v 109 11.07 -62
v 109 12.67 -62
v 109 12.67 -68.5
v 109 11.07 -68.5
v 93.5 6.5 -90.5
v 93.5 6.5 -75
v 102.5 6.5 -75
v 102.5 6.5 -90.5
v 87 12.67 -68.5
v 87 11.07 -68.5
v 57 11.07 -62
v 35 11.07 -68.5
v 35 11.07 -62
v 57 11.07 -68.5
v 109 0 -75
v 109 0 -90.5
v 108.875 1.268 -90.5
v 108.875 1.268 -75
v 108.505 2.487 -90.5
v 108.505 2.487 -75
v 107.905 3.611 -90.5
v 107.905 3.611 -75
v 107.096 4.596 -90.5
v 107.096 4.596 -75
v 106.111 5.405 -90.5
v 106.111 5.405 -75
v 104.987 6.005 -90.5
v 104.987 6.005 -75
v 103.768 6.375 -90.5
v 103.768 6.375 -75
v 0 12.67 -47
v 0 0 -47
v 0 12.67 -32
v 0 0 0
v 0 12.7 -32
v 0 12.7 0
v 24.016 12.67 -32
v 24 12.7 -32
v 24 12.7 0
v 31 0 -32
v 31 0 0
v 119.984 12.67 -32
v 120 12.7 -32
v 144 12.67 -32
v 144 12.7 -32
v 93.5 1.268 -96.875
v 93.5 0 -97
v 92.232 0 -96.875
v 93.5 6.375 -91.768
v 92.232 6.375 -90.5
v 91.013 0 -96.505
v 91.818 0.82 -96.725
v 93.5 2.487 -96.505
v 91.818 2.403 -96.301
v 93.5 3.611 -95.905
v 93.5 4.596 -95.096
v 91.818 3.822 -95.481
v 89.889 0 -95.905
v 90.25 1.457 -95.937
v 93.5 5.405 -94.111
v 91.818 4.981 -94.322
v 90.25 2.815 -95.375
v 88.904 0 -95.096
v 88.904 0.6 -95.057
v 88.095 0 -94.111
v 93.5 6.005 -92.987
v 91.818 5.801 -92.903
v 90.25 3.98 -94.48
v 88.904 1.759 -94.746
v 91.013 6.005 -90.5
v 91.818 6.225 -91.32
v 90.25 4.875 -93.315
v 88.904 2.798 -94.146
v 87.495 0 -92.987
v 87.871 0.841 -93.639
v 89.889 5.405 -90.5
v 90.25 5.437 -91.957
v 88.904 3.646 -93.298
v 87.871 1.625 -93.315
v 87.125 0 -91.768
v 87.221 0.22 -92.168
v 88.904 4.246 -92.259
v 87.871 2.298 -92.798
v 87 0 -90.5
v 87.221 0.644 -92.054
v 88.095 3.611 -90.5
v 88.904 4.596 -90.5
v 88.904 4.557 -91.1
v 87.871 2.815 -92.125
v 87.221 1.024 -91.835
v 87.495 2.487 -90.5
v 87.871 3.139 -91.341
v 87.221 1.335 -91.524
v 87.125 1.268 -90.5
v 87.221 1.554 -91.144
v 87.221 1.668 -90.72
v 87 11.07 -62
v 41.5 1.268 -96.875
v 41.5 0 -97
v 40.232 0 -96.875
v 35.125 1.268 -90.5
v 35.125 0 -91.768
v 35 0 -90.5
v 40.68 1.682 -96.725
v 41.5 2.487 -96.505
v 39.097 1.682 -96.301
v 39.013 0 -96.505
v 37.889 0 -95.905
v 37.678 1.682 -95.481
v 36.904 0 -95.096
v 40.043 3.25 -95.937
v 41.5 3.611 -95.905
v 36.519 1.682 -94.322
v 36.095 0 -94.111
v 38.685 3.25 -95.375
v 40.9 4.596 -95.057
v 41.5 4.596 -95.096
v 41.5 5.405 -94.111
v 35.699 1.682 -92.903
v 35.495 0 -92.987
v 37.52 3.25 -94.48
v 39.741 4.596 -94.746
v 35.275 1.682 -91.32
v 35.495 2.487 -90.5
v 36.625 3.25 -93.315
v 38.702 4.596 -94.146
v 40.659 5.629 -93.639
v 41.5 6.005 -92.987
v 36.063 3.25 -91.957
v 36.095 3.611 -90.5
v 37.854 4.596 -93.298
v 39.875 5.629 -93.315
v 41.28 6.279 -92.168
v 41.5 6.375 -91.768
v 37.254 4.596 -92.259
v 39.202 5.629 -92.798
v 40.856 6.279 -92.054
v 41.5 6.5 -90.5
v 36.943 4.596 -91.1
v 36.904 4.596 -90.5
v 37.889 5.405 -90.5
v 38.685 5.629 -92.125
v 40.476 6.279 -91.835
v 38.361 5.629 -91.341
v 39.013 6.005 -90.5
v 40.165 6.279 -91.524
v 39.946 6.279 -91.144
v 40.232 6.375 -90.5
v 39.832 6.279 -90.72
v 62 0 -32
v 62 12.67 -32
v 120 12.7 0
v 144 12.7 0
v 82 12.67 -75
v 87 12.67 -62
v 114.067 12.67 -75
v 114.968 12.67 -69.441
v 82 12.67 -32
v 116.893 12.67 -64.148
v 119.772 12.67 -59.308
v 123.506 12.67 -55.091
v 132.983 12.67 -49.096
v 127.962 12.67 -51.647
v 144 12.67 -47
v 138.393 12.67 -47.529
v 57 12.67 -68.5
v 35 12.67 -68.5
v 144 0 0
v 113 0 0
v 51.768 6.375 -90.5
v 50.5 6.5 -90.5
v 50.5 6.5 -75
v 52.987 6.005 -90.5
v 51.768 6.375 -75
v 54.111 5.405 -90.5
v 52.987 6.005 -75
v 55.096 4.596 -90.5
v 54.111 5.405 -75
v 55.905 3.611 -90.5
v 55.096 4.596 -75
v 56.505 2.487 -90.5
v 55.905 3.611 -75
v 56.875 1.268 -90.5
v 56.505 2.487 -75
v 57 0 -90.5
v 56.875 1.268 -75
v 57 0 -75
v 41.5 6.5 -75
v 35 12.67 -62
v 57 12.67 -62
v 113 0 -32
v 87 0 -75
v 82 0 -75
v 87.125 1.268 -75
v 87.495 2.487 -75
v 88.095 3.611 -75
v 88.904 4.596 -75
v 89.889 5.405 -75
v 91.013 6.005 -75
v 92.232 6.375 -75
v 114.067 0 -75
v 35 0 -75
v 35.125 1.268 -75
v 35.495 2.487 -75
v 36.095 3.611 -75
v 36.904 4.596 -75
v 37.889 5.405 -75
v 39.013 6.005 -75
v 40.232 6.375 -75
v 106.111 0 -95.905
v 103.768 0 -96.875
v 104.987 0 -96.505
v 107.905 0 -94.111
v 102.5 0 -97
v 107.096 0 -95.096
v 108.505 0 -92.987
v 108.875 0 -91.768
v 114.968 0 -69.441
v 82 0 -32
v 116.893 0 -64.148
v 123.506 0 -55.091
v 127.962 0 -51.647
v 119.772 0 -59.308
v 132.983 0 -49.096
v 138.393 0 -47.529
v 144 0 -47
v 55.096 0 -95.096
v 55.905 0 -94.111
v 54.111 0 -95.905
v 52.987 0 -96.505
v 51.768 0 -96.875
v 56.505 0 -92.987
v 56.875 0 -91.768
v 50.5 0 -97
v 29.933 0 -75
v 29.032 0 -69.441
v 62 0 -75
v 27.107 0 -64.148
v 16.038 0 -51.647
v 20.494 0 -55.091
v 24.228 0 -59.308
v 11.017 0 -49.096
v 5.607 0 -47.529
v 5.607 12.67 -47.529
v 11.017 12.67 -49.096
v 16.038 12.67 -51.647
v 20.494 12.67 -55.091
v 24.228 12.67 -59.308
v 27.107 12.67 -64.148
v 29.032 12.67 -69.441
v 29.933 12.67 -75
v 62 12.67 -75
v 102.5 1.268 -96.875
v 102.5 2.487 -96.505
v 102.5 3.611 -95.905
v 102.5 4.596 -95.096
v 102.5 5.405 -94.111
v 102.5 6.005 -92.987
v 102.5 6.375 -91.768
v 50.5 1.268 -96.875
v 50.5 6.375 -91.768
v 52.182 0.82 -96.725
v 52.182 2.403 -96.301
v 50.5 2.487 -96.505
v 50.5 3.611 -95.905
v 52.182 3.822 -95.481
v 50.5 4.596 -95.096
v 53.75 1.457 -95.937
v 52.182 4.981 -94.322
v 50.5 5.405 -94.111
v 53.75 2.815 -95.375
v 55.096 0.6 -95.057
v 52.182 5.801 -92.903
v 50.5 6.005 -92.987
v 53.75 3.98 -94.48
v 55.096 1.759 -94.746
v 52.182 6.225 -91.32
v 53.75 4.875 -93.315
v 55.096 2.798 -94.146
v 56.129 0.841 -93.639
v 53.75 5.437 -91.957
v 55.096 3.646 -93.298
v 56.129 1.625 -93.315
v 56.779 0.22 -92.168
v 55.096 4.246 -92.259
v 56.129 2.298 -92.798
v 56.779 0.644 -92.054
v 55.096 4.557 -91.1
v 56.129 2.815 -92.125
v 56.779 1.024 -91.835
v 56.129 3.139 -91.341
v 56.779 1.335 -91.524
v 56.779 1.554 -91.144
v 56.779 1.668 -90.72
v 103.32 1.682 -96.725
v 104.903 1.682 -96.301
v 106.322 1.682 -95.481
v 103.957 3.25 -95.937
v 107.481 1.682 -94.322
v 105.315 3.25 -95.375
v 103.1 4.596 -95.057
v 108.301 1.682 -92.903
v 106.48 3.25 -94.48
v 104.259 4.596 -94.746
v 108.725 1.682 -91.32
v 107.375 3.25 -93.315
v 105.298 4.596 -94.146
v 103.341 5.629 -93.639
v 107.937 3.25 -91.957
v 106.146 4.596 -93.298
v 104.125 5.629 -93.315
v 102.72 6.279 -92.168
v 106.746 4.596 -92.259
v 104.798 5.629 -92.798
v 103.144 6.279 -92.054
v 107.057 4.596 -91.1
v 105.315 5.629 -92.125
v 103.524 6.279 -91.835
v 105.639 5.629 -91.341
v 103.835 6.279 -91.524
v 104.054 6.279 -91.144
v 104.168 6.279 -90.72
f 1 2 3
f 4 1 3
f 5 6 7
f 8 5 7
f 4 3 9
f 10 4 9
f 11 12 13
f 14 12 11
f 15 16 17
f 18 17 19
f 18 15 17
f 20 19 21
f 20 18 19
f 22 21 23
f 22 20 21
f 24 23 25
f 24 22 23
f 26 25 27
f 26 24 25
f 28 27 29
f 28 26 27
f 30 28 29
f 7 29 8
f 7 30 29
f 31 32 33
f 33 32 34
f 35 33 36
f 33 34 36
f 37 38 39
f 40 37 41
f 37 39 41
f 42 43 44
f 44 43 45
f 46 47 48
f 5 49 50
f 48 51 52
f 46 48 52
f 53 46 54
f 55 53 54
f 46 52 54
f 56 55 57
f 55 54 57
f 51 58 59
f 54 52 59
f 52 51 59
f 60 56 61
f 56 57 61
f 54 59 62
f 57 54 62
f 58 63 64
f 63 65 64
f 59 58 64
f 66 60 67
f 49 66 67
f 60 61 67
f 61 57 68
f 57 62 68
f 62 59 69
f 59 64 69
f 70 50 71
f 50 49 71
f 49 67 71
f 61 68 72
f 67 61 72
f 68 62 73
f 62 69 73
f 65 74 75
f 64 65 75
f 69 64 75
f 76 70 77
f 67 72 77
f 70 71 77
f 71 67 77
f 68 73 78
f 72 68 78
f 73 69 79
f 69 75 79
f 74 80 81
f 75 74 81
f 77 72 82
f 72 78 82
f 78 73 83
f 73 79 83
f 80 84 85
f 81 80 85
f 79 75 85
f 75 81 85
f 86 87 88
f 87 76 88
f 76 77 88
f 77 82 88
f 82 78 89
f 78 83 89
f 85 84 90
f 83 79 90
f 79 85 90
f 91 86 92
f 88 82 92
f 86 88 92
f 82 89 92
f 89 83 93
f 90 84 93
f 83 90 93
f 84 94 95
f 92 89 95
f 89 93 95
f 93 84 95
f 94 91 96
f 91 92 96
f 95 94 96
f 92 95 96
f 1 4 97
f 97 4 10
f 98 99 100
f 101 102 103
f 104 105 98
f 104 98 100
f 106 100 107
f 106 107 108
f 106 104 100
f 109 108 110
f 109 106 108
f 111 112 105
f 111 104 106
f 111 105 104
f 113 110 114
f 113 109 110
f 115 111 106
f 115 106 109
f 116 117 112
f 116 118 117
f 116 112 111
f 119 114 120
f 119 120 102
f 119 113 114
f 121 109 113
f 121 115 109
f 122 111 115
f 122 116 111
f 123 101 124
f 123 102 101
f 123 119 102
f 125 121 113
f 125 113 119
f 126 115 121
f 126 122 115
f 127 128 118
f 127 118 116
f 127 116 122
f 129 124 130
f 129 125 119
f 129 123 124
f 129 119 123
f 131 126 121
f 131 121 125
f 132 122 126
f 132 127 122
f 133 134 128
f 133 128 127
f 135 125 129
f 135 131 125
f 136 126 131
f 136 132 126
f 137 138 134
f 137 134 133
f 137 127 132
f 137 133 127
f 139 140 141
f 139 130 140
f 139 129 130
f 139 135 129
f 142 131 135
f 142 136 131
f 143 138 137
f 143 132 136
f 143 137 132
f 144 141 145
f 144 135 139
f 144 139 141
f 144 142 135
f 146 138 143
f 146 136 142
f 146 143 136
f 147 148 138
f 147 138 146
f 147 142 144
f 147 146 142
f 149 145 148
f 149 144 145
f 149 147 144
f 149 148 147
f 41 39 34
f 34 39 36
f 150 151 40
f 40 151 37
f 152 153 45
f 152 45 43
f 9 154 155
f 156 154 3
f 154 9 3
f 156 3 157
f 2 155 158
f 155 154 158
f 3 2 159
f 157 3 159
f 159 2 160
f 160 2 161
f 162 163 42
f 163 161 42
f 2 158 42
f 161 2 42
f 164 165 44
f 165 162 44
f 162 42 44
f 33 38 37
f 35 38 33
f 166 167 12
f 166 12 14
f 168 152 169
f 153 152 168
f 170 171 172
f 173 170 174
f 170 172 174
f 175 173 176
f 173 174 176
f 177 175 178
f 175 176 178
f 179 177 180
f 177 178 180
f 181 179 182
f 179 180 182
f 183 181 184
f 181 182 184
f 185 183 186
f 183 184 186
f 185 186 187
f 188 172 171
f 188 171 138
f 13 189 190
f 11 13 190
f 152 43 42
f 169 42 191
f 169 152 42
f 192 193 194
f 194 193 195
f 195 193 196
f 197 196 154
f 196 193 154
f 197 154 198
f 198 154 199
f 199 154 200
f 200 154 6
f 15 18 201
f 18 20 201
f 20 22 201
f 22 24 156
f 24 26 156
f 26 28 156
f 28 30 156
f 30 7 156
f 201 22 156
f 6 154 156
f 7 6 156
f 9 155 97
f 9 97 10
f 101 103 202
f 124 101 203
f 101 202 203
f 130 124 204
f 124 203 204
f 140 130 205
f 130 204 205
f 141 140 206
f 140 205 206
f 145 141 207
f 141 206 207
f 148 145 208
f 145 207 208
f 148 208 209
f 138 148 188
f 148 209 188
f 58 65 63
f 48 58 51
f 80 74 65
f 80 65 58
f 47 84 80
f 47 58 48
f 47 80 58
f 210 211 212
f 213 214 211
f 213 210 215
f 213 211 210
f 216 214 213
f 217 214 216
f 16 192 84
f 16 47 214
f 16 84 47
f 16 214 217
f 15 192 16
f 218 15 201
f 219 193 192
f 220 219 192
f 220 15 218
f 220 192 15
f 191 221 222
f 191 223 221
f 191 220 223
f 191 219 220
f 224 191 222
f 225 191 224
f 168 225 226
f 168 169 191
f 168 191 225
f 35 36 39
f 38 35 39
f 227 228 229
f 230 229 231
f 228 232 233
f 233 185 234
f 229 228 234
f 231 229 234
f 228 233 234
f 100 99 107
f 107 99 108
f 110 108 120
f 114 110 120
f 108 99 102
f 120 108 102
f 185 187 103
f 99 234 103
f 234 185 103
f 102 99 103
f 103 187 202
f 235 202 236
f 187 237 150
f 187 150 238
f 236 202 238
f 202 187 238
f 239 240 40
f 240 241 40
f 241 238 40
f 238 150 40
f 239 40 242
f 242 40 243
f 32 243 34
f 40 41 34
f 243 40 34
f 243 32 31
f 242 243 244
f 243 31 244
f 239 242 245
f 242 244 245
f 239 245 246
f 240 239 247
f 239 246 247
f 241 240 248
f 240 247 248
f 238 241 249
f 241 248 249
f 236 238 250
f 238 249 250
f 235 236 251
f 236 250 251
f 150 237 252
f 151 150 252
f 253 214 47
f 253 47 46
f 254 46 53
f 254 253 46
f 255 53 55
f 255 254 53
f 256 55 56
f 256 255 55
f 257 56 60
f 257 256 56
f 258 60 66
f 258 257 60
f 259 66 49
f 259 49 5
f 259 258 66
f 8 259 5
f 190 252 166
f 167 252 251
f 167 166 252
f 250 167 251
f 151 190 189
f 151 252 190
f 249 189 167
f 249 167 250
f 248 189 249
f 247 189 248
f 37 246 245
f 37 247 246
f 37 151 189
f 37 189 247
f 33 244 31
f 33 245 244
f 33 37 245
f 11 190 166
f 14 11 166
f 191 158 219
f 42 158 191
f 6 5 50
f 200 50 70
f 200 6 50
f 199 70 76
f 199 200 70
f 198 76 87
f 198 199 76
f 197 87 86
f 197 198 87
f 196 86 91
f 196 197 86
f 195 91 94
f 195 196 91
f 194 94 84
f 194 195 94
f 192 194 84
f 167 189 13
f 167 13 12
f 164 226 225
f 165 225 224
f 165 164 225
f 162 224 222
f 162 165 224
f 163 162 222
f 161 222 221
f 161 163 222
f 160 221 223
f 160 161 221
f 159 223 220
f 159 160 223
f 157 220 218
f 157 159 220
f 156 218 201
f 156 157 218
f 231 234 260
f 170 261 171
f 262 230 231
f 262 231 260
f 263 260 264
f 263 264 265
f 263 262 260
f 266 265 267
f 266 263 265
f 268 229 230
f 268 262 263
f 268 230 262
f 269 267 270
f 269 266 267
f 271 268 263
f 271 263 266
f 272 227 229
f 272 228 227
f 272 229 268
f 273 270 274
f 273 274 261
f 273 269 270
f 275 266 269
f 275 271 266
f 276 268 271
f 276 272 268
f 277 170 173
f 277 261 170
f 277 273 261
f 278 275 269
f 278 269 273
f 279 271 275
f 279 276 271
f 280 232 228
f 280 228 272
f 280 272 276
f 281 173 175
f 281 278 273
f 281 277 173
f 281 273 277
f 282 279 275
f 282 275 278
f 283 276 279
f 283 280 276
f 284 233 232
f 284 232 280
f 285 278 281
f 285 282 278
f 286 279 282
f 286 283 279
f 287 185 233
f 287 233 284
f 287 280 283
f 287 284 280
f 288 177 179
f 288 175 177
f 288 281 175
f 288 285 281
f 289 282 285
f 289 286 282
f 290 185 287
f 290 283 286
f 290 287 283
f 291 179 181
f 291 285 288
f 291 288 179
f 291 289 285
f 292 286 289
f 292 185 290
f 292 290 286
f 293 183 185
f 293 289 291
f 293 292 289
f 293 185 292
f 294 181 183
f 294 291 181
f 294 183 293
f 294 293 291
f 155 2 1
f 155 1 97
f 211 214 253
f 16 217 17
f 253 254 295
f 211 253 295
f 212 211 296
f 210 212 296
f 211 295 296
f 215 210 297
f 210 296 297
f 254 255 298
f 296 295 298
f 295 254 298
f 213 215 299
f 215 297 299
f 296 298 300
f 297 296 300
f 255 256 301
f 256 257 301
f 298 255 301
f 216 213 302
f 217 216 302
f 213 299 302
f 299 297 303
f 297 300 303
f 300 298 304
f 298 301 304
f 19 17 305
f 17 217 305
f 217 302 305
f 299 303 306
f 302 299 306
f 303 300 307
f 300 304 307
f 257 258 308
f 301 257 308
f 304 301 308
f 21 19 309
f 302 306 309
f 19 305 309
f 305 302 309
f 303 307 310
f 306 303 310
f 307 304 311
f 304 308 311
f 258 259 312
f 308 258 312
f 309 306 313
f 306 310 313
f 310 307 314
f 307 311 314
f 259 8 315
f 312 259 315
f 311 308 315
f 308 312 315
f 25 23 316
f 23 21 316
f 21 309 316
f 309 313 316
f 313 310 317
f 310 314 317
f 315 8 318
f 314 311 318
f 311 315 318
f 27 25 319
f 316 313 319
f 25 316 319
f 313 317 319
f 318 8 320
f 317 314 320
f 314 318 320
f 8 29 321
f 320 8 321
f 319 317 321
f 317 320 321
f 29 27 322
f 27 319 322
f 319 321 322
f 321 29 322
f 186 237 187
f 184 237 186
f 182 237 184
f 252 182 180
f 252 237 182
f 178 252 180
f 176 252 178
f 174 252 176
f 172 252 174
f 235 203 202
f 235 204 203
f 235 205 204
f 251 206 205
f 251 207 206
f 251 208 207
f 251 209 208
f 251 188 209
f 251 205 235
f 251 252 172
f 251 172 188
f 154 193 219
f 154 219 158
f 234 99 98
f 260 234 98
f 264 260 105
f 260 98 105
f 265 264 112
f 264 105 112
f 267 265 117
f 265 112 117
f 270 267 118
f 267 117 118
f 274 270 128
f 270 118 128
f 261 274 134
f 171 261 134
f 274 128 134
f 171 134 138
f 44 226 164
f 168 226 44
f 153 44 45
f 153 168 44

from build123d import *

# Parameters (mm, degrees)
EXTRUDE_1_DEPTH     = 32
SKETCH_2_W          = 62
SKETCH_2_H          = 12.670241622
EXTRUDE_2_DEPTH     = 43
SKETCH_3_R          = 30
CUT_EXTRUDE_1_DEPTH = 99.130194246
SKETCH_4_W          = 22
SKETCH_4_H          = 6.5
EXTRUDE_3_DEPTH     = 22
FILLET_1_R          = 6.5
SKETCH_5_W          = 22
SKETCH_5_H          = 6.5
CUT_EXTRUDE_2_DEPTH = 1.6


with BuildPart() as part:
    # Эскиз1 → Бобышка-Вытянуть1 (new body)
    with BuildSketch(Plane.XY):
        Polygon((0, 0), (0, 12.7), (24, 12.7), (31, 0), align=None)
    extrude(amount=-EXTRUDE_1_DEPTH)

    # Эскиз2 → Бобышка-Вытянуть2 (add)
    with BuildSketch(Plane(origin=(0, 0, -32), x_dir=(-1, 0, 0), z_dir=(0, 0, -1))):
        with Locations((-31, 6.335120811)):
            Rectangle(SKETCH_2_W, SKETCH_2_H)
    extrude(amount=EXTRUDE_2_DEPTH)

    # Эскиз3 → Вырез-Вытянуть1 (cut, through all)
    with BuildSketch(Plane(origin=(0, 12.670241622, 0), x_dir=(1, 0, 0), z_dir=(0, 1, 0))):
        with Locations((0, 77)):
            Circle(SKETCH_3_R)
    extrude(amount=-CUT_EXTRUDE_1_DEPTH, mode=Mode.SUBTRACT)

    # Эскиз4 → Бобышка-Вытянуть3 (add)
    with BuildSketch(Plane(origin=(0, 0, -75), x_dir=(-1, 0, 0), z_dir=(0, 0, -1))):
        with Locations((-46, 3.25)):
            Rectangle(SKETCH_4_W, SKETCH_4_H)
    extrude(amount=EXTRUDE_3_DEPTH)

    # Скругление1
    # the kernel refuses this fillet: 6.5 mm, written as the material it adds along each edge
    # the kernel refuses this fillet: 6.5 mm, written as the material it takes off along each edge
    with BuildSketch(Plane(origin=(50.5, 0, -90.5), x_dir=(0, 1, 0), z_dir=(1, 0, 0))) as fillet_1_2_piece_1_section:
        Polygon((0, 0), (FILLET_1_R * 1.02, 0), (FILLET_1_R * 1.02, -FILLET_1_R * 1.02), (0, -FILLET_1_R * 1.02), align=None)
    fillet_1_2_piece_1 = extrude(amount=FILLET_1_R * 1.02, mode=Mode.PRIVATE)
    fillet_1_2_piece_1 = fillet_1_2_piece_1 - Plane(origin=(50.5, 0, -90.5), x_dir=(0, -0.7071067811865475, 0.7071067811865475), z_dir=(1, 0, 0)) * Sphere(FILLET_1_R, mode=Mode.PRIVATE)
    add(fillet_1_2_piece_1, mode=Mode.SUBTRACT)
    with BuildSketch(Plane(origin=(41.5, 0, -90.5), x_dir=(-1, 0, 0), z_dir=(0, 1, 0))) as fillet_1_2_piece_2_section:
        Polygon((0, 0), (FILLET_1_R * 1.02, 0), (FILLET_1_R * 1.02, -FILLET_1_R * 1.02), (0, -FILLET_1_R * 1.02), align=None)
    fillet_1_2_piece_2 = extrude(amount=FILLET_1_R * 1.02, mode=Mode.PRIVATE)
    fillet_1_2_piece_2 = fillet_1_2_piece_2 - Plane(origin=(41.5, 0, -90.5), x_dir=(0.7071067811865475, 0, 0.7071067811865475), z_dir=(0, 1, 0)) * Sphere(FILLET_1_R, mode=Mode.PRIVATE)
    add(fillet_1_2_piece_2, mode=Mode.SUBTRACT)
    with BuildSketch(Plane(origin=(57, 6.5, -75), x_dir=(0, -1, 0), z_dir=(0, 0, -1)), Plane(origin=(35, 6.5, -75), x_dir=(1, 0, 0), z_dir=(0, 0, -1))) as fillet_1_2_piece_3:
        with BuildLine():
            CenterArc((FILLET_1_R, FILLET_1_R), FILLET_1_R, 180, 90)
            Line((0, FILLET_1_R), (0, 0))
            Line((0, 0), (FILLET_1_R, 0))
        make_face()
    extrude(amount=15.5, mode=Mode.SUBTRACT)
    with BuildSketch(Plane(origin=(41.5, 6.5, -97), x_dir=(0, 0, 1), z_dir=(1, 0, 0))) as fillet_1_2_piece_4:
        with BuildLine():
            CenterArc((FILLET_1_R, FILLET_1_R), FILLET_1_R, 180, 90)
            Line((0, FILLET_1_R), (0, 0))
            Line((0, 0), (FILLET_1_R, 0))
        make_face()
    extrude(amount=9, mode=Mode.SUBTRACT)

    # Эскиз5 → Вырез-Вытянуть2 (cut)
    with BuildSketch(Plane(origin=(0, 12.670241622, 0), x_dir=(1, 0, 0), z_dir=(0, 1, 0))):
        with Locations((46, 65.25)):
            Rectangle(SKETCH_5_W, SKETCH_5_H)
    extrude(amount=-CUT_EXTRUDE_2_DEPTH, mode=Mode.SUBTRACT)


with BuildPart() as body_2:
    # Зеркальное отражение1: mirrored copy
    add(part.part.mirror(Plane(origin=(72, 0, 0), x_dir=(0, 0, 1), z_dir=(1, 0, 0))))


solid = Compound([part.part, body_2.part])
